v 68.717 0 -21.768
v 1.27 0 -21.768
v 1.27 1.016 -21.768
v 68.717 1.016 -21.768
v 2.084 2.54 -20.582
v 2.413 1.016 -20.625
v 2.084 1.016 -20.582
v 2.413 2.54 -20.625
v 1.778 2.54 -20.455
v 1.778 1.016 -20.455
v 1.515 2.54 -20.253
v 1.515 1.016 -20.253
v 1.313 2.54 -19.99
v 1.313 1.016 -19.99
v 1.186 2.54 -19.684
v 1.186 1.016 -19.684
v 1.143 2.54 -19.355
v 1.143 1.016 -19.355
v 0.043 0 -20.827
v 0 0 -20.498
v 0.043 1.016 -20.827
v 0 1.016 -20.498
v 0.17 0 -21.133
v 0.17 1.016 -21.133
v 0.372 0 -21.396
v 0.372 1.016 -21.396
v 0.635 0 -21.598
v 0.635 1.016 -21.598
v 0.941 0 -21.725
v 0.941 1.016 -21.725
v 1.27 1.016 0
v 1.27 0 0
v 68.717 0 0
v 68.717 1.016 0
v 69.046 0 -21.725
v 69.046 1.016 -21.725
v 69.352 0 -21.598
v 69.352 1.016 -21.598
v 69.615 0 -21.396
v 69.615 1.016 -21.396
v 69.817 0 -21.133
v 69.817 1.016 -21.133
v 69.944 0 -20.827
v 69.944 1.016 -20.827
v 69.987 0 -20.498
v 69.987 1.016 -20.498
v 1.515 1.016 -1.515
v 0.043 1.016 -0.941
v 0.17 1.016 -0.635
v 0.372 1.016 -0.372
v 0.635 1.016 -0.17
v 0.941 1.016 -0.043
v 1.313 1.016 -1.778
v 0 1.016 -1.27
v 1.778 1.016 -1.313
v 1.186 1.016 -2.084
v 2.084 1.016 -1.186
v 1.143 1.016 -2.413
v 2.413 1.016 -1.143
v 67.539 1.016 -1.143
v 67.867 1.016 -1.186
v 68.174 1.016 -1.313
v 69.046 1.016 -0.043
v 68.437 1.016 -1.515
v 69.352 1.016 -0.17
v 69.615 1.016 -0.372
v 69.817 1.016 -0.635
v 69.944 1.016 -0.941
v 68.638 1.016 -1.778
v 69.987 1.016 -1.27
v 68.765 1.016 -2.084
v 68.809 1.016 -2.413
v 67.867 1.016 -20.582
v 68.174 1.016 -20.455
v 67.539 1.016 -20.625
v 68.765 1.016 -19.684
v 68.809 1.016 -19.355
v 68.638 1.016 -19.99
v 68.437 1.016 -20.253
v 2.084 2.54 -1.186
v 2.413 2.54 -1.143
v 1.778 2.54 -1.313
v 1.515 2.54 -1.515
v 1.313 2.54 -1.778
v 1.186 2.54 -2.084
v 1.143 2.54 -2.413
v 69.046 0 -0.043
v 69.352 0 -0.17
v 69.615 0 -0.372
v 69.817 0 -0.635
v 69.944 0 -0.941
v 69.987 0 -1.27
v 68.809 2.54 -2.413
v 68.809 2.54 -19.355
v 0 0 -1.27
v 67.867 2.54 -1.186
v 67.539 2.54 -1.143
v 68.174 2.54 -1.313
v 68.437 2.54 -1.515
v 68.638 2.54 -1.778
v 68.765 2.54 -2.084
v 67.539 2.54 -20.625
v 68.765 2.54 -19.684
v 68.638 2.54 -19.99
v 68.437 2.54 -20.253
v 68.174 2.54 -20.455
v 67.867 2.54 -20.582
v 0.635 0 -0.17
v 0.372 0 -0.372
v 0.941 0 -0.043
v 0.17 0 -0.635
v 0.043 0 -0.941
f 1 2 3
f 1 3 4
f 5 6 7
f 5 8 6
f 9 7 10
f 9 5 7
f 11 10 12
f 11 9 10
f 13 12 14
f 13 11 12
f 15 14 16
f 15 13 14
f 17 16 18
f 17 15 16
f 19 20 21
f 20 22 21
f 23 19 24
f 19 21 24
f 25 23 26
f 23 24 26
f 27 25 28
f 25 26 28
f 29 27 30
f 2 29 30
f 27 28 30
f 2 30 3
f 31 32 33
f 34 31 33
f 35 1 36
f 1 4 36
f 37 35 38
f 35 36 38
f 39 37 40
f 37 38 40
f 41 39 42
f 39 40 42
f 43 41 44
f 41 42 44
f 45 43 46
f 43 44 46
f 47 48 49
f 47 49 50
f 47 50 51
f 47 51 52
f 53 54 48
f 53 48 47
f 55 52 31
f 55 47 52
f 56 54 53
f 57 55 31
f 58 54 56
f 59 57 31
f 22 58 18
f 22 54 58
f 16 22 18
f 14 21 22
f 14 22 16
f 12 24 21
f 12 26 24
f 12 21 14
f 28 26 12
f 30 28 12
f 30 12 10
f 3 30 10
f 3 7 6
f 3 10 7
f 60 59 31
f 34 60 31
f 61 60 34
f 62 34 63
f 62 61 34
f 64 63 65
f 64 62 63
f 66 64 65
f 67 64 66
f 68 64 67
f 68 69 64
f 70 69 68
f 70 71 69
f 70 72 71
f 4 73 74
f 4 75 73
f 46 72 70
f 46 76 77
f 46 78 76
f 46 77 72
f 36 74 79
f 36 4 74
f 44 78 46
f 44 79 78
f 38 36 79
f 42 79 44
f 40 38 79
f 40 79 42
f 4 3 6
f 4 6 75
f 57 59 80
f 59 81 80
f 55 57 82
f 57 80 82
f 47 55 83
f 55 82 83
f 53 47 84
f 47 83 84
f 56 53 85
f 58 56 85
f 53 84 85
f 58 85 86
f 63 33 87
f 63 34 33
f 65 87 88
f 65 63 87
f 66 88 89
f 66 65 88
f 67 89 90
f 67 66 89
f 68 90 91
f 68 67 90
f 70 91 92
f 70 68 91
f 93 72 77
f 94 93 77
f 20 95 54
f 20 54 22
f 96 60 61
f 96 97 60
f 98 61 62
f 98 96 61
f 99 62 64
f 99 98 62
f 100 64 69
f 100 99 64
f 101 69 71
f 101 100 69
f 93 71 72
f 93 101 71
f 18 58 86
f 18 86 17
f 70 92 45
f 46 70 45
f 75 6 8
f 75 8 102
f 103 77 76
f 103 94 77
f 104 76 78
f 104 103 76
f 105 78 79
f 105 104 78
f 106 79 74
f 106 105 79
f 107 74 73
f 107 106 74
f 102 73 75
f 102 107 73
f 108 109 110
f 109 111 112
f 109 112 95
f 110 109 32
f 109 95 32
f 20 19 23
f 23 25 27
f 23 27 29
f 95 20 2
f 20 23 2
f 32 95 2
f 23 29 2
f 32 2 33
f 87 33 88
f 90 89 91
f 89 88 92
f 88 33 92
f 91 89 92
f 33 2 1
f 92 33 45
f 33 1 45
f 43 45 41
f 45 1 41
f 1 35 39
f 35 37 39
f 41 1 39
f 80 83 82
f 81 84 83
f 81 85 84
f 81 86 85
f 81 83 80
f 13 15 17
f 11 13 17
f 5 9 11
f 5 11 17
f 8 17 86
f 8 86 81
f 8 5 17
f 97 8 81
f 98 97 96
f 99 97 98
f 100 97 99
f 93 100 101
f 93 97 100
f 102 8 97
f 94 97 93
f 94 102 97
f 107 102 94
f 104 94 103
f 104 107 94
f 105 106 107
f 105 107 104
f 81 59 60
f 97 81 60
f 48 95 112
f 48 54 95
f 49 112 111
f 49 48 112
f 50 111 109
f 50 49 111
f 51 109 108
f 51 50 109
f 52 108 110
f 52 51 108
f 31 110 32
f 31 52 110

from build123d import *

# Parameters (mm, degrees)
SKETCH2_W           = 69.98716
SKETCH2_H           = 21.7678
BOSS_EXTRUDE1_DEPTH = 1.016
SKETCH3_W           = 67.6656
SKETCH3_H           = 19.4818
BOSS_EXTRUDE2_DEPTH = 1.524
FILLET1_R           = 1.27


with BuildPart() as part:
    # Sketch2 → Boss-Extrude1 (new body)
    with BuildSketch(Plane(origin=(0, 0, 0), x_dir=(1, 0, 0), z_dir=(0, 1, 0))):
        with Locations((34.99358, 10.8839)):
            Rectangle(SKETCH2_W, SKETCH2_H)
    extrude(amount=BOSS_EXTRUDE1_DEPTH)

    # Sketch3 → Boss-Extrude2 (add)
    with BuildSketch(Plane(origin=(0, 1.016, 0), x_dir=(1, 0, 0), z_dir=(0, 1, 0))):
        with Locations((34.9758, 10.8839)):
            Rectangle(SKETCH3_W, SKETCH3_H)
    extrude(amount=BOSS_EXTRUDE2_DEPTH)

    # Fillet1
    fillet1_edges = [part.edges().sort_by_distance(p)[0] for p in [
        (1.143, 1.778, -20.6248),
        (1.143, 1.778, -1.143),
        (68.8086, 1.778, -1.143),
        (68.8086, 1.778, -20.6248),
        (0, 0.508, -21.7678),
        (69.98716, 0.508, -21.7678),
        (69.98716, 0.508, 0),
        (0, 0.508, 0),
    ]]
    fillet(fillet1_edges, radius=FILLET1_R)


solid = part.part
